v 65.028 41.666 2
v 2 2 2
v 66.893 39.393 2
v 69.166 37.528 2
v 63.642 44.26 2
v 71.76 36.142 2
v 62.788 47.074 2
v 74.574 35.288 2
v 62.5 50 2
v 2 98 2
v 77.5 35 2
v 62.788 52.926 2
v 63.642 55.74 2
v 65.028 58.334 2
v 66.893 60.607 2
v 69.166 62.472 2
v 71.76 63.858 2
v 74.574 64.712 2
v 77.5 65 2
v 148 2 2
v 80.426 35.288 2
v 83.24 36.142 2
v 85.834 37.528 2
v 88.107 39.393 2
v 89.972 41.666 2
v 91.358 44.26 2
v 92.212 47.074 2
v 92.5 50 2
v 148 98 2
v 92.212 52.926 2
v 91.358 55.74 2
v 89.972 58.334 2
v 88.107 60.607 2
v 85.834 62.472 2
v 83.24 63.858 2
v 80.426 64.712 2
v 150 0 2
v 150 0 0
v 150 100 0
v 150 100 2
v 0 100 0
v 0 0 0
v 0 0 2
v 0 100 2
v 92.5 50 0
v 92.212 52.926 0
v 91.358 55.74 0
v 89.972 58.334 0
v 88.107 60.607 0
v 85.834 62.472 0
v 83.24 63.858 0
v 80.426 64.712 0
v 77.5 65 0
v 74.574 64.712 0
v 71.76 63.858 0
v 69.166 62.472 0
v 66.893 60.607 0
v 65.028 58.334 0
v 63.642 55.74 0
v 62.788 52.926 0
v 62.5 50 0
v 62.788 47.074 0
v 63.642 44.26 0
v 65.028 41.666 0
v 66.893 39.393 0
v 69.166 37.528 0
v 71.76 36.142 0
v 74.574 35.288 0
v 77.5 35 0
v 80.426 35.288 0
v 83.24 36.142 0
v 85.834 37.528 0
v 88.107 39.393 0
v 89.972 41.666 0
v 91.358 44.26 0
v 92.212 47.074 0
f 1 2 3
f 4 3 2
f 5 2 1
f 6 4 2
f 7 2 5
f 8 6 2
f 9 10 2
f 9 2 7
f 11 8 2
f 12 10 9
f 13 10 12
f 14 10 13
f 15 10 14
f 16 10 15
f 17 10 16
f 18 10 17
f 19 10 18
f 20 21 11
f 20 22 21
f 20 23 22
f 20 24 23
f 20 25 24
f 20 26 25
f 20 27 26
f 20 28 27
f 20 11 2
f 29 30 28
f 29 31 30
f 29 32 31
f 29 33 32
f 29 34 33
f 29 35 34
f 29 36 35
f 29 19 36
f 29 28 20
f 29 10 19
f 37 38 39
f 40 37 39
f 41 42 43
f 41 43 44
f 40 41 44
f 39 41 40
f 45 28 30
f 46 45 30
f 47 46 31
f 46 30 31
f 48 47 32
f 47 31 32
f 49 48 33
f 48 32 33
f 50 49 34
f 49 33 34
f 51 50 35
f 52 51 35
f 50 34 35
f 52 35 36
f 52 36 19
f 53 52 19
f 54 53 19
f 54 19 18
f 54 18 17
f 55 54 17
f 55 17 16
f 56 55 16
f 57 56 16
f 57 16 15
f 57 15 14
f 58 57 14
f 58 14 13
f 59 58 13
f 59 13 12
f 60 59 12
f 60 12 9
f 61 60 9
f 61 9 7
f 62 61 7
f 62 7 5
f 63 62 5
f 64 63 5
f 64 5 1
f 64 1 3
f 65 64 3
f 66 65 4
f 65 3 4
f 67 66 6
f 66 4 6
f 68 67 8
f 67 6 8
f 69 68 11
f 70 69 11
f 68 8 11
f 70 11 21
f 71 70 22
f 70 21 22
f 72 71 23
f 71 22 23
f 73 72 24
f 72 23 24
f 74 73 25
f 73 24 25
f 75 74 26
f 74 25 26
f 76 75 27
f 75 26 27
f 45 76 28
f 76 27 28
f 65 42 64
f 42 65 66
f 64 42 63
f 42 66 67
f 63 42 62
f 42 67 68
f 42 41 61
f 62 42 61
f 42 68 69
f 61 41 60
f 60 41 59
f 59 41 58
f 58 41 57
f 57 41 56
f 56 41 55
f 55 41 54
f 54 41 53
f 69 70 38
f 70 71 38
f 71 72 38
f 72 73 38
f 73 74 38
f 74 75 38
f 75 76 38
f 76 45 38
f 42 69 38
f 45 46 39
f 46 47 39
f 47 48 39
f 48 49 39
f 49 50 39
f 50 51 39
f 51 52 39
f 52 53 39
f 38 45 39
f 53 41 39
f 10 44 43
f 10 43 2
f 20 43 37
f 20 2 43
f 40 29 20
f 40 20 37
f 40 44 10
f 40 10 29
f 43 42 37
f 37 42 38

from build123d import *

# Parameters (mm, degrees)
ESQUISSE2_W             = 150
ESQUISSE2_H             = 100
BOSS_EXTRU_1_DEPTH      = 2
ESQUISSE3_W             = 146
ESQUISSE3_H             = 96
ENL_V_MAT_EXTRU_1_DEPTH = 0.0001
ESQUISSE4_R             = 15
ENL_V_MAT_EXTRU_2_DEPTH = 2.5


with BuildPart() as part:
    # Esquisse2 → Boss.-Extru.1 (new body)
    with BuildSketch(Plane.XY):
        with Locations((75, 50)):
            Rectangle(ESQUISSE2_W, ESQUISSE2_H)
    extrude(amount=BOSS_EXTRU_1_DEPTH)

    # Esquisse3 → Enlèv. mat.-Extru.1 (cut)
    with BuildSketch(Plane.XY.offset(2)):
        with Locations((75, 50)):
            Rectangle(ESQUISSE3_W, ESQUISSE3_H)
    extrude(amount=-ENL_V_MAT_EXTRU_1_DEPTH, mode=Mode.SUBTRACT)

    # Esquisse4 → Enlèv. mat.-Extru.2 (cut)
    with BuildSketch(Plane.XY.offset(1.9999)):
        with Locations((77.5, 50)):
            Circle(ESQUISSE4_R)
    extrude(amount=-ENL_V_MAT_EXTRU_2_DEPTH, mode=Mode.SUBTRACT)


solid = part.part
